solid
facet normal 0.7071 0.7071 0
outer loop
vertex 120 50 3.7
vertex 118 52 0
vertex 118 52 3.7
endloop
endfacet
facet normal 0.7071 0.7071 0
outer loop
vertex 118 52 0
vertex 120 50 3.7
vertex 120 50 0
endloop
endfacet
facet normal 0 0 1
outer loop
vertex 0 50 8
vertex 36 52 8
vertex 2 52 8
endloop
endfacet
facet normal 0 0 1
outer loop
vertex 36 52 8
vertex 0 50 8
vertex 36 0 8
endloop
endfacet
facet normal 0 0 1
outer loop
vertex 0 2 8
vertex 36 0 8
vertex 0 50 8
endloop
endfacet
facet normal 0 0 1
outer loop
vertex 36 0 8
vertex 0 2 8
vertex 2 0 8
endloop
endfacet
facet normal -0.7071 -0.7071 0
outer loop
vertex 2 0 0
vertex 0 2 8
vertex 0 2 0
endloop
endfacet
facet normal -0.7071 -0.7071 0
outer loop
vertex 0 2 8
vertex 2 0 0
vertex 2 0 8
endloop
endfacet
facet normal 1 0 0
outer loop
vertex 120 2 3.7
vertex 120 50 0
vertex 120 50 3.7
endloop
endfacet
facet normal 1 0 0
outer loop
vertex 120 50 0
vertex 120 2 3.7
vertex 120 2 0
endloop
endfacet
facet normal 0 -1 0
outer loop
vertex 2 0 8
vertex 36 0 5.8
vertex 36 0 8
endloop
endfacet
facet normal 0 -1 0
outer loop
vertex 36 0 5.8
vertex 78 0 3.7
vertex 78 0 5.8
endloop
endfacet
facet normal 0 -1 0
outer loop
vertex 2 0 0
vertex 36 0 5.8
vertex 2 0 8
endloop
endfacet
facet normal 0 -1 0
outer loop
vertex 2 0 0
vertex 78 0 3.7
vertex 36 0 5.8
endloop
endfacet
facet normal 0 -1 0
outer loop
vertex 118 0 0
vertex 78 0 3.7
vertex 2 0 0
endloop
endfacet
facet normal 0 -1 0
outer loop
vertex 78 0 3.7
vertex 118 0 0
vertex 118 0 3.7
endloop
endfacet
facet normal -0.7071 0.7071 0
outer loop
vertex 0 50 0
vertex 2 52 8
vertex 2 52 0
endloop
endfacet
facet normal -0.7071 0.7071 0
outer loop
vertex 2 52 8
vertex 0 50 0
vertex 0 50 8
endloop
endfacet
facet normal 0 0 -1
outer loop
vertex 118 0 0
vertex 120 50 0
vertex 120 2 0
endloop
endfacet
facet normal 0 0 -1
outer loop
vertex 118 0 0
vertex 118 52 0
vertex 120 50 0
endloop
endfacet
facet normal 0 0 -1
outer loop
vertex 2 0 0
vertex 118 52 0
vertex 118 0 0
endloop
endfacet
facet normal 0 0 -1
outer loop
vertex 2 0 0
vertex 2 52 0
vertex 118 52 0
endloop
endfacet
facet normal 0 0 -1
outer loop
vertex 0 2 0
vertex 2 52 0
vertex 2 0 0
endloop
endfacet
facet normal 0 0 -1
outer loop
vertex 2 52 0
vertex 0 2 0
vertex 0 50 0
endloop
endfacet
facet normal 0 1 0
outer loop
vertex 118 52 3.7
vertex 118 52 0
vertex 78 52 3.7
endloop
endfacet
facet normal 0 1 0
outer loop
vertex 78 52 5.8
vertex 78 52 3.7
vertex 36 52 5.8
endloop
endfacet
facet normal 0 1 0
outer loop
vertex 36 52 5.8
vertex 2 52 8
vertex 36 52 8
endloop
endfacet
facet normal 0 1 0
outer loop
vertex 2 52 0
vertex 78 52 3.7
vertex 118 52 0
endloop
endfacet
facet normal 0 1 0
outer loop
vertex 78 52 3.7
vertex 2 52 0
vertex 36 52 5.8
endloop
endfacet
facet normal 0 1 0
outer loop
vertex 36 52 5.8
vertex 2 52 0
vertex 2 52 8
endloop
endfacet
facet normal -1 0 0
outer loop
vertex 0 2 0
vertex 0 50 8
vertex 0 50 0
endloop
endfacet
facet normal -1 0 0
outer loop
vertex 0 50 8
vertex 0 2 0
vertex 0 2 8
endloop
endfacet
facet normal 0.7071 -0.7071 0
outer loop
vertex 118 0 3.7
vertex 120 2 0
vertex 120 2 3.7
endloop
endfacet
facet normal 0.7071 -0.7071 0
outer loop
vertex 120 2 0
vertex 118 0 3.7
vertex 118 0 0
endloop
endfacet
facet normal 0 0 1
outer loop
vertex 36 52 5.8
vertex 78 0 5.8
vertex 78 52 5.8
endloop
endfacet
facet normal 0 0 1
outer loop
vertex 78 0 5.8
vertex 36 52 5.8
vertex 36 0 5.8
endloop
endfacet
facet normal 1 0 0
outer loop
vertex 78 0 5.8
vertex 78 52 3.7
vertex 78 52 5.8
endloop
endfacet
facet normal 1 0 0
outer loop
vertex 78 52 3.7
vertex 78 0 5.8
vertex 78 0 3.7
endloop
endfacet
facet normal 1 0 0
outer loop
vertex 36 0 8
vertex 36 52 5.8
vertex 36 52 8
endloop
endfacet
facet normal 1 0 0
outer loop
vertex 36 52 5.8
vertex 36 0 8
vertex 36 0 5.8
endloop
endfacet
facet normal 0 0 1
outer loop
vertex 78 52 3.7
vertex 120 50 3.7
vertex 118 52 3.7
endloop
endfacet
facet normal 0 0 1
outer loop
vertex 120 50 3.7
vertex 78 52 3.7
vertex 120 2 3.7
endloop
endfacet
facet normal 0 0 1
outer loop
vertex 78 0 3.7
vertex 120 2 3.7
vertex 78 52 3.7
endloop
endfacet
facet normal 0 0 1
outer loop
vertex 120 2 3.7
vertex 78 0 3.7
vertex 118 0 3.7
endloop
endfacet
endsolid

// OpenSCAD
$fn = 32;

// ----------------------------------------------------------------------
// Stepped bar: twostep, 120 x 52 x 8/3.7 mm
// ----------------------------------------------------------------------

// --- parameters (mm) ---
bar_l = 120;              // bar length, X
bar_w = 52;               // bar width, Y
plate_t = 8;              // thickness of the thick zone, Z
thin_t = 3.7;             // thickness of the thin zone
corner_c = 2;             // corner chamfer of the bar
step_cut = 4.3;           // material removed from the thin zone
stair1_x = 36;            // position of the first stair
stair2_x = 78;            // position of the second stair
mid_t = 5.8;              // thickness of the middle zone
depth_1 = 2.2;            // depth of cut 1 from the top face
depth_2 = 4.3;            // depth of cut 2 from the top face

profile = [[2, 0], [118, 0], [120, 2], [120, 50], [118, 52], [2, 52], [0, 50], [0, 2]];  // primary outline, 8 points, counter clockwise
void_1 = [[36, -1], [78, -1], [78, 53], [36, 53]];  // first stair, 4 points
void_2 = [[78, -1], [121, -1], [121, 53], [78, 53]];  // second stair, 4 points

// --- the one profile operation ---
difference() {
  linear_extrude(height = plate_t) polygon(points = profile);
  translate([0, 0, plate_t - depth_1])
    linear_extrude(height = depth_1 + 1) polygon(points = void_1);
  translate([0, 0, plate_t - depth_2])
    linear_extrude(height = depth_2 + 1) polygon(points = void_2);
}
